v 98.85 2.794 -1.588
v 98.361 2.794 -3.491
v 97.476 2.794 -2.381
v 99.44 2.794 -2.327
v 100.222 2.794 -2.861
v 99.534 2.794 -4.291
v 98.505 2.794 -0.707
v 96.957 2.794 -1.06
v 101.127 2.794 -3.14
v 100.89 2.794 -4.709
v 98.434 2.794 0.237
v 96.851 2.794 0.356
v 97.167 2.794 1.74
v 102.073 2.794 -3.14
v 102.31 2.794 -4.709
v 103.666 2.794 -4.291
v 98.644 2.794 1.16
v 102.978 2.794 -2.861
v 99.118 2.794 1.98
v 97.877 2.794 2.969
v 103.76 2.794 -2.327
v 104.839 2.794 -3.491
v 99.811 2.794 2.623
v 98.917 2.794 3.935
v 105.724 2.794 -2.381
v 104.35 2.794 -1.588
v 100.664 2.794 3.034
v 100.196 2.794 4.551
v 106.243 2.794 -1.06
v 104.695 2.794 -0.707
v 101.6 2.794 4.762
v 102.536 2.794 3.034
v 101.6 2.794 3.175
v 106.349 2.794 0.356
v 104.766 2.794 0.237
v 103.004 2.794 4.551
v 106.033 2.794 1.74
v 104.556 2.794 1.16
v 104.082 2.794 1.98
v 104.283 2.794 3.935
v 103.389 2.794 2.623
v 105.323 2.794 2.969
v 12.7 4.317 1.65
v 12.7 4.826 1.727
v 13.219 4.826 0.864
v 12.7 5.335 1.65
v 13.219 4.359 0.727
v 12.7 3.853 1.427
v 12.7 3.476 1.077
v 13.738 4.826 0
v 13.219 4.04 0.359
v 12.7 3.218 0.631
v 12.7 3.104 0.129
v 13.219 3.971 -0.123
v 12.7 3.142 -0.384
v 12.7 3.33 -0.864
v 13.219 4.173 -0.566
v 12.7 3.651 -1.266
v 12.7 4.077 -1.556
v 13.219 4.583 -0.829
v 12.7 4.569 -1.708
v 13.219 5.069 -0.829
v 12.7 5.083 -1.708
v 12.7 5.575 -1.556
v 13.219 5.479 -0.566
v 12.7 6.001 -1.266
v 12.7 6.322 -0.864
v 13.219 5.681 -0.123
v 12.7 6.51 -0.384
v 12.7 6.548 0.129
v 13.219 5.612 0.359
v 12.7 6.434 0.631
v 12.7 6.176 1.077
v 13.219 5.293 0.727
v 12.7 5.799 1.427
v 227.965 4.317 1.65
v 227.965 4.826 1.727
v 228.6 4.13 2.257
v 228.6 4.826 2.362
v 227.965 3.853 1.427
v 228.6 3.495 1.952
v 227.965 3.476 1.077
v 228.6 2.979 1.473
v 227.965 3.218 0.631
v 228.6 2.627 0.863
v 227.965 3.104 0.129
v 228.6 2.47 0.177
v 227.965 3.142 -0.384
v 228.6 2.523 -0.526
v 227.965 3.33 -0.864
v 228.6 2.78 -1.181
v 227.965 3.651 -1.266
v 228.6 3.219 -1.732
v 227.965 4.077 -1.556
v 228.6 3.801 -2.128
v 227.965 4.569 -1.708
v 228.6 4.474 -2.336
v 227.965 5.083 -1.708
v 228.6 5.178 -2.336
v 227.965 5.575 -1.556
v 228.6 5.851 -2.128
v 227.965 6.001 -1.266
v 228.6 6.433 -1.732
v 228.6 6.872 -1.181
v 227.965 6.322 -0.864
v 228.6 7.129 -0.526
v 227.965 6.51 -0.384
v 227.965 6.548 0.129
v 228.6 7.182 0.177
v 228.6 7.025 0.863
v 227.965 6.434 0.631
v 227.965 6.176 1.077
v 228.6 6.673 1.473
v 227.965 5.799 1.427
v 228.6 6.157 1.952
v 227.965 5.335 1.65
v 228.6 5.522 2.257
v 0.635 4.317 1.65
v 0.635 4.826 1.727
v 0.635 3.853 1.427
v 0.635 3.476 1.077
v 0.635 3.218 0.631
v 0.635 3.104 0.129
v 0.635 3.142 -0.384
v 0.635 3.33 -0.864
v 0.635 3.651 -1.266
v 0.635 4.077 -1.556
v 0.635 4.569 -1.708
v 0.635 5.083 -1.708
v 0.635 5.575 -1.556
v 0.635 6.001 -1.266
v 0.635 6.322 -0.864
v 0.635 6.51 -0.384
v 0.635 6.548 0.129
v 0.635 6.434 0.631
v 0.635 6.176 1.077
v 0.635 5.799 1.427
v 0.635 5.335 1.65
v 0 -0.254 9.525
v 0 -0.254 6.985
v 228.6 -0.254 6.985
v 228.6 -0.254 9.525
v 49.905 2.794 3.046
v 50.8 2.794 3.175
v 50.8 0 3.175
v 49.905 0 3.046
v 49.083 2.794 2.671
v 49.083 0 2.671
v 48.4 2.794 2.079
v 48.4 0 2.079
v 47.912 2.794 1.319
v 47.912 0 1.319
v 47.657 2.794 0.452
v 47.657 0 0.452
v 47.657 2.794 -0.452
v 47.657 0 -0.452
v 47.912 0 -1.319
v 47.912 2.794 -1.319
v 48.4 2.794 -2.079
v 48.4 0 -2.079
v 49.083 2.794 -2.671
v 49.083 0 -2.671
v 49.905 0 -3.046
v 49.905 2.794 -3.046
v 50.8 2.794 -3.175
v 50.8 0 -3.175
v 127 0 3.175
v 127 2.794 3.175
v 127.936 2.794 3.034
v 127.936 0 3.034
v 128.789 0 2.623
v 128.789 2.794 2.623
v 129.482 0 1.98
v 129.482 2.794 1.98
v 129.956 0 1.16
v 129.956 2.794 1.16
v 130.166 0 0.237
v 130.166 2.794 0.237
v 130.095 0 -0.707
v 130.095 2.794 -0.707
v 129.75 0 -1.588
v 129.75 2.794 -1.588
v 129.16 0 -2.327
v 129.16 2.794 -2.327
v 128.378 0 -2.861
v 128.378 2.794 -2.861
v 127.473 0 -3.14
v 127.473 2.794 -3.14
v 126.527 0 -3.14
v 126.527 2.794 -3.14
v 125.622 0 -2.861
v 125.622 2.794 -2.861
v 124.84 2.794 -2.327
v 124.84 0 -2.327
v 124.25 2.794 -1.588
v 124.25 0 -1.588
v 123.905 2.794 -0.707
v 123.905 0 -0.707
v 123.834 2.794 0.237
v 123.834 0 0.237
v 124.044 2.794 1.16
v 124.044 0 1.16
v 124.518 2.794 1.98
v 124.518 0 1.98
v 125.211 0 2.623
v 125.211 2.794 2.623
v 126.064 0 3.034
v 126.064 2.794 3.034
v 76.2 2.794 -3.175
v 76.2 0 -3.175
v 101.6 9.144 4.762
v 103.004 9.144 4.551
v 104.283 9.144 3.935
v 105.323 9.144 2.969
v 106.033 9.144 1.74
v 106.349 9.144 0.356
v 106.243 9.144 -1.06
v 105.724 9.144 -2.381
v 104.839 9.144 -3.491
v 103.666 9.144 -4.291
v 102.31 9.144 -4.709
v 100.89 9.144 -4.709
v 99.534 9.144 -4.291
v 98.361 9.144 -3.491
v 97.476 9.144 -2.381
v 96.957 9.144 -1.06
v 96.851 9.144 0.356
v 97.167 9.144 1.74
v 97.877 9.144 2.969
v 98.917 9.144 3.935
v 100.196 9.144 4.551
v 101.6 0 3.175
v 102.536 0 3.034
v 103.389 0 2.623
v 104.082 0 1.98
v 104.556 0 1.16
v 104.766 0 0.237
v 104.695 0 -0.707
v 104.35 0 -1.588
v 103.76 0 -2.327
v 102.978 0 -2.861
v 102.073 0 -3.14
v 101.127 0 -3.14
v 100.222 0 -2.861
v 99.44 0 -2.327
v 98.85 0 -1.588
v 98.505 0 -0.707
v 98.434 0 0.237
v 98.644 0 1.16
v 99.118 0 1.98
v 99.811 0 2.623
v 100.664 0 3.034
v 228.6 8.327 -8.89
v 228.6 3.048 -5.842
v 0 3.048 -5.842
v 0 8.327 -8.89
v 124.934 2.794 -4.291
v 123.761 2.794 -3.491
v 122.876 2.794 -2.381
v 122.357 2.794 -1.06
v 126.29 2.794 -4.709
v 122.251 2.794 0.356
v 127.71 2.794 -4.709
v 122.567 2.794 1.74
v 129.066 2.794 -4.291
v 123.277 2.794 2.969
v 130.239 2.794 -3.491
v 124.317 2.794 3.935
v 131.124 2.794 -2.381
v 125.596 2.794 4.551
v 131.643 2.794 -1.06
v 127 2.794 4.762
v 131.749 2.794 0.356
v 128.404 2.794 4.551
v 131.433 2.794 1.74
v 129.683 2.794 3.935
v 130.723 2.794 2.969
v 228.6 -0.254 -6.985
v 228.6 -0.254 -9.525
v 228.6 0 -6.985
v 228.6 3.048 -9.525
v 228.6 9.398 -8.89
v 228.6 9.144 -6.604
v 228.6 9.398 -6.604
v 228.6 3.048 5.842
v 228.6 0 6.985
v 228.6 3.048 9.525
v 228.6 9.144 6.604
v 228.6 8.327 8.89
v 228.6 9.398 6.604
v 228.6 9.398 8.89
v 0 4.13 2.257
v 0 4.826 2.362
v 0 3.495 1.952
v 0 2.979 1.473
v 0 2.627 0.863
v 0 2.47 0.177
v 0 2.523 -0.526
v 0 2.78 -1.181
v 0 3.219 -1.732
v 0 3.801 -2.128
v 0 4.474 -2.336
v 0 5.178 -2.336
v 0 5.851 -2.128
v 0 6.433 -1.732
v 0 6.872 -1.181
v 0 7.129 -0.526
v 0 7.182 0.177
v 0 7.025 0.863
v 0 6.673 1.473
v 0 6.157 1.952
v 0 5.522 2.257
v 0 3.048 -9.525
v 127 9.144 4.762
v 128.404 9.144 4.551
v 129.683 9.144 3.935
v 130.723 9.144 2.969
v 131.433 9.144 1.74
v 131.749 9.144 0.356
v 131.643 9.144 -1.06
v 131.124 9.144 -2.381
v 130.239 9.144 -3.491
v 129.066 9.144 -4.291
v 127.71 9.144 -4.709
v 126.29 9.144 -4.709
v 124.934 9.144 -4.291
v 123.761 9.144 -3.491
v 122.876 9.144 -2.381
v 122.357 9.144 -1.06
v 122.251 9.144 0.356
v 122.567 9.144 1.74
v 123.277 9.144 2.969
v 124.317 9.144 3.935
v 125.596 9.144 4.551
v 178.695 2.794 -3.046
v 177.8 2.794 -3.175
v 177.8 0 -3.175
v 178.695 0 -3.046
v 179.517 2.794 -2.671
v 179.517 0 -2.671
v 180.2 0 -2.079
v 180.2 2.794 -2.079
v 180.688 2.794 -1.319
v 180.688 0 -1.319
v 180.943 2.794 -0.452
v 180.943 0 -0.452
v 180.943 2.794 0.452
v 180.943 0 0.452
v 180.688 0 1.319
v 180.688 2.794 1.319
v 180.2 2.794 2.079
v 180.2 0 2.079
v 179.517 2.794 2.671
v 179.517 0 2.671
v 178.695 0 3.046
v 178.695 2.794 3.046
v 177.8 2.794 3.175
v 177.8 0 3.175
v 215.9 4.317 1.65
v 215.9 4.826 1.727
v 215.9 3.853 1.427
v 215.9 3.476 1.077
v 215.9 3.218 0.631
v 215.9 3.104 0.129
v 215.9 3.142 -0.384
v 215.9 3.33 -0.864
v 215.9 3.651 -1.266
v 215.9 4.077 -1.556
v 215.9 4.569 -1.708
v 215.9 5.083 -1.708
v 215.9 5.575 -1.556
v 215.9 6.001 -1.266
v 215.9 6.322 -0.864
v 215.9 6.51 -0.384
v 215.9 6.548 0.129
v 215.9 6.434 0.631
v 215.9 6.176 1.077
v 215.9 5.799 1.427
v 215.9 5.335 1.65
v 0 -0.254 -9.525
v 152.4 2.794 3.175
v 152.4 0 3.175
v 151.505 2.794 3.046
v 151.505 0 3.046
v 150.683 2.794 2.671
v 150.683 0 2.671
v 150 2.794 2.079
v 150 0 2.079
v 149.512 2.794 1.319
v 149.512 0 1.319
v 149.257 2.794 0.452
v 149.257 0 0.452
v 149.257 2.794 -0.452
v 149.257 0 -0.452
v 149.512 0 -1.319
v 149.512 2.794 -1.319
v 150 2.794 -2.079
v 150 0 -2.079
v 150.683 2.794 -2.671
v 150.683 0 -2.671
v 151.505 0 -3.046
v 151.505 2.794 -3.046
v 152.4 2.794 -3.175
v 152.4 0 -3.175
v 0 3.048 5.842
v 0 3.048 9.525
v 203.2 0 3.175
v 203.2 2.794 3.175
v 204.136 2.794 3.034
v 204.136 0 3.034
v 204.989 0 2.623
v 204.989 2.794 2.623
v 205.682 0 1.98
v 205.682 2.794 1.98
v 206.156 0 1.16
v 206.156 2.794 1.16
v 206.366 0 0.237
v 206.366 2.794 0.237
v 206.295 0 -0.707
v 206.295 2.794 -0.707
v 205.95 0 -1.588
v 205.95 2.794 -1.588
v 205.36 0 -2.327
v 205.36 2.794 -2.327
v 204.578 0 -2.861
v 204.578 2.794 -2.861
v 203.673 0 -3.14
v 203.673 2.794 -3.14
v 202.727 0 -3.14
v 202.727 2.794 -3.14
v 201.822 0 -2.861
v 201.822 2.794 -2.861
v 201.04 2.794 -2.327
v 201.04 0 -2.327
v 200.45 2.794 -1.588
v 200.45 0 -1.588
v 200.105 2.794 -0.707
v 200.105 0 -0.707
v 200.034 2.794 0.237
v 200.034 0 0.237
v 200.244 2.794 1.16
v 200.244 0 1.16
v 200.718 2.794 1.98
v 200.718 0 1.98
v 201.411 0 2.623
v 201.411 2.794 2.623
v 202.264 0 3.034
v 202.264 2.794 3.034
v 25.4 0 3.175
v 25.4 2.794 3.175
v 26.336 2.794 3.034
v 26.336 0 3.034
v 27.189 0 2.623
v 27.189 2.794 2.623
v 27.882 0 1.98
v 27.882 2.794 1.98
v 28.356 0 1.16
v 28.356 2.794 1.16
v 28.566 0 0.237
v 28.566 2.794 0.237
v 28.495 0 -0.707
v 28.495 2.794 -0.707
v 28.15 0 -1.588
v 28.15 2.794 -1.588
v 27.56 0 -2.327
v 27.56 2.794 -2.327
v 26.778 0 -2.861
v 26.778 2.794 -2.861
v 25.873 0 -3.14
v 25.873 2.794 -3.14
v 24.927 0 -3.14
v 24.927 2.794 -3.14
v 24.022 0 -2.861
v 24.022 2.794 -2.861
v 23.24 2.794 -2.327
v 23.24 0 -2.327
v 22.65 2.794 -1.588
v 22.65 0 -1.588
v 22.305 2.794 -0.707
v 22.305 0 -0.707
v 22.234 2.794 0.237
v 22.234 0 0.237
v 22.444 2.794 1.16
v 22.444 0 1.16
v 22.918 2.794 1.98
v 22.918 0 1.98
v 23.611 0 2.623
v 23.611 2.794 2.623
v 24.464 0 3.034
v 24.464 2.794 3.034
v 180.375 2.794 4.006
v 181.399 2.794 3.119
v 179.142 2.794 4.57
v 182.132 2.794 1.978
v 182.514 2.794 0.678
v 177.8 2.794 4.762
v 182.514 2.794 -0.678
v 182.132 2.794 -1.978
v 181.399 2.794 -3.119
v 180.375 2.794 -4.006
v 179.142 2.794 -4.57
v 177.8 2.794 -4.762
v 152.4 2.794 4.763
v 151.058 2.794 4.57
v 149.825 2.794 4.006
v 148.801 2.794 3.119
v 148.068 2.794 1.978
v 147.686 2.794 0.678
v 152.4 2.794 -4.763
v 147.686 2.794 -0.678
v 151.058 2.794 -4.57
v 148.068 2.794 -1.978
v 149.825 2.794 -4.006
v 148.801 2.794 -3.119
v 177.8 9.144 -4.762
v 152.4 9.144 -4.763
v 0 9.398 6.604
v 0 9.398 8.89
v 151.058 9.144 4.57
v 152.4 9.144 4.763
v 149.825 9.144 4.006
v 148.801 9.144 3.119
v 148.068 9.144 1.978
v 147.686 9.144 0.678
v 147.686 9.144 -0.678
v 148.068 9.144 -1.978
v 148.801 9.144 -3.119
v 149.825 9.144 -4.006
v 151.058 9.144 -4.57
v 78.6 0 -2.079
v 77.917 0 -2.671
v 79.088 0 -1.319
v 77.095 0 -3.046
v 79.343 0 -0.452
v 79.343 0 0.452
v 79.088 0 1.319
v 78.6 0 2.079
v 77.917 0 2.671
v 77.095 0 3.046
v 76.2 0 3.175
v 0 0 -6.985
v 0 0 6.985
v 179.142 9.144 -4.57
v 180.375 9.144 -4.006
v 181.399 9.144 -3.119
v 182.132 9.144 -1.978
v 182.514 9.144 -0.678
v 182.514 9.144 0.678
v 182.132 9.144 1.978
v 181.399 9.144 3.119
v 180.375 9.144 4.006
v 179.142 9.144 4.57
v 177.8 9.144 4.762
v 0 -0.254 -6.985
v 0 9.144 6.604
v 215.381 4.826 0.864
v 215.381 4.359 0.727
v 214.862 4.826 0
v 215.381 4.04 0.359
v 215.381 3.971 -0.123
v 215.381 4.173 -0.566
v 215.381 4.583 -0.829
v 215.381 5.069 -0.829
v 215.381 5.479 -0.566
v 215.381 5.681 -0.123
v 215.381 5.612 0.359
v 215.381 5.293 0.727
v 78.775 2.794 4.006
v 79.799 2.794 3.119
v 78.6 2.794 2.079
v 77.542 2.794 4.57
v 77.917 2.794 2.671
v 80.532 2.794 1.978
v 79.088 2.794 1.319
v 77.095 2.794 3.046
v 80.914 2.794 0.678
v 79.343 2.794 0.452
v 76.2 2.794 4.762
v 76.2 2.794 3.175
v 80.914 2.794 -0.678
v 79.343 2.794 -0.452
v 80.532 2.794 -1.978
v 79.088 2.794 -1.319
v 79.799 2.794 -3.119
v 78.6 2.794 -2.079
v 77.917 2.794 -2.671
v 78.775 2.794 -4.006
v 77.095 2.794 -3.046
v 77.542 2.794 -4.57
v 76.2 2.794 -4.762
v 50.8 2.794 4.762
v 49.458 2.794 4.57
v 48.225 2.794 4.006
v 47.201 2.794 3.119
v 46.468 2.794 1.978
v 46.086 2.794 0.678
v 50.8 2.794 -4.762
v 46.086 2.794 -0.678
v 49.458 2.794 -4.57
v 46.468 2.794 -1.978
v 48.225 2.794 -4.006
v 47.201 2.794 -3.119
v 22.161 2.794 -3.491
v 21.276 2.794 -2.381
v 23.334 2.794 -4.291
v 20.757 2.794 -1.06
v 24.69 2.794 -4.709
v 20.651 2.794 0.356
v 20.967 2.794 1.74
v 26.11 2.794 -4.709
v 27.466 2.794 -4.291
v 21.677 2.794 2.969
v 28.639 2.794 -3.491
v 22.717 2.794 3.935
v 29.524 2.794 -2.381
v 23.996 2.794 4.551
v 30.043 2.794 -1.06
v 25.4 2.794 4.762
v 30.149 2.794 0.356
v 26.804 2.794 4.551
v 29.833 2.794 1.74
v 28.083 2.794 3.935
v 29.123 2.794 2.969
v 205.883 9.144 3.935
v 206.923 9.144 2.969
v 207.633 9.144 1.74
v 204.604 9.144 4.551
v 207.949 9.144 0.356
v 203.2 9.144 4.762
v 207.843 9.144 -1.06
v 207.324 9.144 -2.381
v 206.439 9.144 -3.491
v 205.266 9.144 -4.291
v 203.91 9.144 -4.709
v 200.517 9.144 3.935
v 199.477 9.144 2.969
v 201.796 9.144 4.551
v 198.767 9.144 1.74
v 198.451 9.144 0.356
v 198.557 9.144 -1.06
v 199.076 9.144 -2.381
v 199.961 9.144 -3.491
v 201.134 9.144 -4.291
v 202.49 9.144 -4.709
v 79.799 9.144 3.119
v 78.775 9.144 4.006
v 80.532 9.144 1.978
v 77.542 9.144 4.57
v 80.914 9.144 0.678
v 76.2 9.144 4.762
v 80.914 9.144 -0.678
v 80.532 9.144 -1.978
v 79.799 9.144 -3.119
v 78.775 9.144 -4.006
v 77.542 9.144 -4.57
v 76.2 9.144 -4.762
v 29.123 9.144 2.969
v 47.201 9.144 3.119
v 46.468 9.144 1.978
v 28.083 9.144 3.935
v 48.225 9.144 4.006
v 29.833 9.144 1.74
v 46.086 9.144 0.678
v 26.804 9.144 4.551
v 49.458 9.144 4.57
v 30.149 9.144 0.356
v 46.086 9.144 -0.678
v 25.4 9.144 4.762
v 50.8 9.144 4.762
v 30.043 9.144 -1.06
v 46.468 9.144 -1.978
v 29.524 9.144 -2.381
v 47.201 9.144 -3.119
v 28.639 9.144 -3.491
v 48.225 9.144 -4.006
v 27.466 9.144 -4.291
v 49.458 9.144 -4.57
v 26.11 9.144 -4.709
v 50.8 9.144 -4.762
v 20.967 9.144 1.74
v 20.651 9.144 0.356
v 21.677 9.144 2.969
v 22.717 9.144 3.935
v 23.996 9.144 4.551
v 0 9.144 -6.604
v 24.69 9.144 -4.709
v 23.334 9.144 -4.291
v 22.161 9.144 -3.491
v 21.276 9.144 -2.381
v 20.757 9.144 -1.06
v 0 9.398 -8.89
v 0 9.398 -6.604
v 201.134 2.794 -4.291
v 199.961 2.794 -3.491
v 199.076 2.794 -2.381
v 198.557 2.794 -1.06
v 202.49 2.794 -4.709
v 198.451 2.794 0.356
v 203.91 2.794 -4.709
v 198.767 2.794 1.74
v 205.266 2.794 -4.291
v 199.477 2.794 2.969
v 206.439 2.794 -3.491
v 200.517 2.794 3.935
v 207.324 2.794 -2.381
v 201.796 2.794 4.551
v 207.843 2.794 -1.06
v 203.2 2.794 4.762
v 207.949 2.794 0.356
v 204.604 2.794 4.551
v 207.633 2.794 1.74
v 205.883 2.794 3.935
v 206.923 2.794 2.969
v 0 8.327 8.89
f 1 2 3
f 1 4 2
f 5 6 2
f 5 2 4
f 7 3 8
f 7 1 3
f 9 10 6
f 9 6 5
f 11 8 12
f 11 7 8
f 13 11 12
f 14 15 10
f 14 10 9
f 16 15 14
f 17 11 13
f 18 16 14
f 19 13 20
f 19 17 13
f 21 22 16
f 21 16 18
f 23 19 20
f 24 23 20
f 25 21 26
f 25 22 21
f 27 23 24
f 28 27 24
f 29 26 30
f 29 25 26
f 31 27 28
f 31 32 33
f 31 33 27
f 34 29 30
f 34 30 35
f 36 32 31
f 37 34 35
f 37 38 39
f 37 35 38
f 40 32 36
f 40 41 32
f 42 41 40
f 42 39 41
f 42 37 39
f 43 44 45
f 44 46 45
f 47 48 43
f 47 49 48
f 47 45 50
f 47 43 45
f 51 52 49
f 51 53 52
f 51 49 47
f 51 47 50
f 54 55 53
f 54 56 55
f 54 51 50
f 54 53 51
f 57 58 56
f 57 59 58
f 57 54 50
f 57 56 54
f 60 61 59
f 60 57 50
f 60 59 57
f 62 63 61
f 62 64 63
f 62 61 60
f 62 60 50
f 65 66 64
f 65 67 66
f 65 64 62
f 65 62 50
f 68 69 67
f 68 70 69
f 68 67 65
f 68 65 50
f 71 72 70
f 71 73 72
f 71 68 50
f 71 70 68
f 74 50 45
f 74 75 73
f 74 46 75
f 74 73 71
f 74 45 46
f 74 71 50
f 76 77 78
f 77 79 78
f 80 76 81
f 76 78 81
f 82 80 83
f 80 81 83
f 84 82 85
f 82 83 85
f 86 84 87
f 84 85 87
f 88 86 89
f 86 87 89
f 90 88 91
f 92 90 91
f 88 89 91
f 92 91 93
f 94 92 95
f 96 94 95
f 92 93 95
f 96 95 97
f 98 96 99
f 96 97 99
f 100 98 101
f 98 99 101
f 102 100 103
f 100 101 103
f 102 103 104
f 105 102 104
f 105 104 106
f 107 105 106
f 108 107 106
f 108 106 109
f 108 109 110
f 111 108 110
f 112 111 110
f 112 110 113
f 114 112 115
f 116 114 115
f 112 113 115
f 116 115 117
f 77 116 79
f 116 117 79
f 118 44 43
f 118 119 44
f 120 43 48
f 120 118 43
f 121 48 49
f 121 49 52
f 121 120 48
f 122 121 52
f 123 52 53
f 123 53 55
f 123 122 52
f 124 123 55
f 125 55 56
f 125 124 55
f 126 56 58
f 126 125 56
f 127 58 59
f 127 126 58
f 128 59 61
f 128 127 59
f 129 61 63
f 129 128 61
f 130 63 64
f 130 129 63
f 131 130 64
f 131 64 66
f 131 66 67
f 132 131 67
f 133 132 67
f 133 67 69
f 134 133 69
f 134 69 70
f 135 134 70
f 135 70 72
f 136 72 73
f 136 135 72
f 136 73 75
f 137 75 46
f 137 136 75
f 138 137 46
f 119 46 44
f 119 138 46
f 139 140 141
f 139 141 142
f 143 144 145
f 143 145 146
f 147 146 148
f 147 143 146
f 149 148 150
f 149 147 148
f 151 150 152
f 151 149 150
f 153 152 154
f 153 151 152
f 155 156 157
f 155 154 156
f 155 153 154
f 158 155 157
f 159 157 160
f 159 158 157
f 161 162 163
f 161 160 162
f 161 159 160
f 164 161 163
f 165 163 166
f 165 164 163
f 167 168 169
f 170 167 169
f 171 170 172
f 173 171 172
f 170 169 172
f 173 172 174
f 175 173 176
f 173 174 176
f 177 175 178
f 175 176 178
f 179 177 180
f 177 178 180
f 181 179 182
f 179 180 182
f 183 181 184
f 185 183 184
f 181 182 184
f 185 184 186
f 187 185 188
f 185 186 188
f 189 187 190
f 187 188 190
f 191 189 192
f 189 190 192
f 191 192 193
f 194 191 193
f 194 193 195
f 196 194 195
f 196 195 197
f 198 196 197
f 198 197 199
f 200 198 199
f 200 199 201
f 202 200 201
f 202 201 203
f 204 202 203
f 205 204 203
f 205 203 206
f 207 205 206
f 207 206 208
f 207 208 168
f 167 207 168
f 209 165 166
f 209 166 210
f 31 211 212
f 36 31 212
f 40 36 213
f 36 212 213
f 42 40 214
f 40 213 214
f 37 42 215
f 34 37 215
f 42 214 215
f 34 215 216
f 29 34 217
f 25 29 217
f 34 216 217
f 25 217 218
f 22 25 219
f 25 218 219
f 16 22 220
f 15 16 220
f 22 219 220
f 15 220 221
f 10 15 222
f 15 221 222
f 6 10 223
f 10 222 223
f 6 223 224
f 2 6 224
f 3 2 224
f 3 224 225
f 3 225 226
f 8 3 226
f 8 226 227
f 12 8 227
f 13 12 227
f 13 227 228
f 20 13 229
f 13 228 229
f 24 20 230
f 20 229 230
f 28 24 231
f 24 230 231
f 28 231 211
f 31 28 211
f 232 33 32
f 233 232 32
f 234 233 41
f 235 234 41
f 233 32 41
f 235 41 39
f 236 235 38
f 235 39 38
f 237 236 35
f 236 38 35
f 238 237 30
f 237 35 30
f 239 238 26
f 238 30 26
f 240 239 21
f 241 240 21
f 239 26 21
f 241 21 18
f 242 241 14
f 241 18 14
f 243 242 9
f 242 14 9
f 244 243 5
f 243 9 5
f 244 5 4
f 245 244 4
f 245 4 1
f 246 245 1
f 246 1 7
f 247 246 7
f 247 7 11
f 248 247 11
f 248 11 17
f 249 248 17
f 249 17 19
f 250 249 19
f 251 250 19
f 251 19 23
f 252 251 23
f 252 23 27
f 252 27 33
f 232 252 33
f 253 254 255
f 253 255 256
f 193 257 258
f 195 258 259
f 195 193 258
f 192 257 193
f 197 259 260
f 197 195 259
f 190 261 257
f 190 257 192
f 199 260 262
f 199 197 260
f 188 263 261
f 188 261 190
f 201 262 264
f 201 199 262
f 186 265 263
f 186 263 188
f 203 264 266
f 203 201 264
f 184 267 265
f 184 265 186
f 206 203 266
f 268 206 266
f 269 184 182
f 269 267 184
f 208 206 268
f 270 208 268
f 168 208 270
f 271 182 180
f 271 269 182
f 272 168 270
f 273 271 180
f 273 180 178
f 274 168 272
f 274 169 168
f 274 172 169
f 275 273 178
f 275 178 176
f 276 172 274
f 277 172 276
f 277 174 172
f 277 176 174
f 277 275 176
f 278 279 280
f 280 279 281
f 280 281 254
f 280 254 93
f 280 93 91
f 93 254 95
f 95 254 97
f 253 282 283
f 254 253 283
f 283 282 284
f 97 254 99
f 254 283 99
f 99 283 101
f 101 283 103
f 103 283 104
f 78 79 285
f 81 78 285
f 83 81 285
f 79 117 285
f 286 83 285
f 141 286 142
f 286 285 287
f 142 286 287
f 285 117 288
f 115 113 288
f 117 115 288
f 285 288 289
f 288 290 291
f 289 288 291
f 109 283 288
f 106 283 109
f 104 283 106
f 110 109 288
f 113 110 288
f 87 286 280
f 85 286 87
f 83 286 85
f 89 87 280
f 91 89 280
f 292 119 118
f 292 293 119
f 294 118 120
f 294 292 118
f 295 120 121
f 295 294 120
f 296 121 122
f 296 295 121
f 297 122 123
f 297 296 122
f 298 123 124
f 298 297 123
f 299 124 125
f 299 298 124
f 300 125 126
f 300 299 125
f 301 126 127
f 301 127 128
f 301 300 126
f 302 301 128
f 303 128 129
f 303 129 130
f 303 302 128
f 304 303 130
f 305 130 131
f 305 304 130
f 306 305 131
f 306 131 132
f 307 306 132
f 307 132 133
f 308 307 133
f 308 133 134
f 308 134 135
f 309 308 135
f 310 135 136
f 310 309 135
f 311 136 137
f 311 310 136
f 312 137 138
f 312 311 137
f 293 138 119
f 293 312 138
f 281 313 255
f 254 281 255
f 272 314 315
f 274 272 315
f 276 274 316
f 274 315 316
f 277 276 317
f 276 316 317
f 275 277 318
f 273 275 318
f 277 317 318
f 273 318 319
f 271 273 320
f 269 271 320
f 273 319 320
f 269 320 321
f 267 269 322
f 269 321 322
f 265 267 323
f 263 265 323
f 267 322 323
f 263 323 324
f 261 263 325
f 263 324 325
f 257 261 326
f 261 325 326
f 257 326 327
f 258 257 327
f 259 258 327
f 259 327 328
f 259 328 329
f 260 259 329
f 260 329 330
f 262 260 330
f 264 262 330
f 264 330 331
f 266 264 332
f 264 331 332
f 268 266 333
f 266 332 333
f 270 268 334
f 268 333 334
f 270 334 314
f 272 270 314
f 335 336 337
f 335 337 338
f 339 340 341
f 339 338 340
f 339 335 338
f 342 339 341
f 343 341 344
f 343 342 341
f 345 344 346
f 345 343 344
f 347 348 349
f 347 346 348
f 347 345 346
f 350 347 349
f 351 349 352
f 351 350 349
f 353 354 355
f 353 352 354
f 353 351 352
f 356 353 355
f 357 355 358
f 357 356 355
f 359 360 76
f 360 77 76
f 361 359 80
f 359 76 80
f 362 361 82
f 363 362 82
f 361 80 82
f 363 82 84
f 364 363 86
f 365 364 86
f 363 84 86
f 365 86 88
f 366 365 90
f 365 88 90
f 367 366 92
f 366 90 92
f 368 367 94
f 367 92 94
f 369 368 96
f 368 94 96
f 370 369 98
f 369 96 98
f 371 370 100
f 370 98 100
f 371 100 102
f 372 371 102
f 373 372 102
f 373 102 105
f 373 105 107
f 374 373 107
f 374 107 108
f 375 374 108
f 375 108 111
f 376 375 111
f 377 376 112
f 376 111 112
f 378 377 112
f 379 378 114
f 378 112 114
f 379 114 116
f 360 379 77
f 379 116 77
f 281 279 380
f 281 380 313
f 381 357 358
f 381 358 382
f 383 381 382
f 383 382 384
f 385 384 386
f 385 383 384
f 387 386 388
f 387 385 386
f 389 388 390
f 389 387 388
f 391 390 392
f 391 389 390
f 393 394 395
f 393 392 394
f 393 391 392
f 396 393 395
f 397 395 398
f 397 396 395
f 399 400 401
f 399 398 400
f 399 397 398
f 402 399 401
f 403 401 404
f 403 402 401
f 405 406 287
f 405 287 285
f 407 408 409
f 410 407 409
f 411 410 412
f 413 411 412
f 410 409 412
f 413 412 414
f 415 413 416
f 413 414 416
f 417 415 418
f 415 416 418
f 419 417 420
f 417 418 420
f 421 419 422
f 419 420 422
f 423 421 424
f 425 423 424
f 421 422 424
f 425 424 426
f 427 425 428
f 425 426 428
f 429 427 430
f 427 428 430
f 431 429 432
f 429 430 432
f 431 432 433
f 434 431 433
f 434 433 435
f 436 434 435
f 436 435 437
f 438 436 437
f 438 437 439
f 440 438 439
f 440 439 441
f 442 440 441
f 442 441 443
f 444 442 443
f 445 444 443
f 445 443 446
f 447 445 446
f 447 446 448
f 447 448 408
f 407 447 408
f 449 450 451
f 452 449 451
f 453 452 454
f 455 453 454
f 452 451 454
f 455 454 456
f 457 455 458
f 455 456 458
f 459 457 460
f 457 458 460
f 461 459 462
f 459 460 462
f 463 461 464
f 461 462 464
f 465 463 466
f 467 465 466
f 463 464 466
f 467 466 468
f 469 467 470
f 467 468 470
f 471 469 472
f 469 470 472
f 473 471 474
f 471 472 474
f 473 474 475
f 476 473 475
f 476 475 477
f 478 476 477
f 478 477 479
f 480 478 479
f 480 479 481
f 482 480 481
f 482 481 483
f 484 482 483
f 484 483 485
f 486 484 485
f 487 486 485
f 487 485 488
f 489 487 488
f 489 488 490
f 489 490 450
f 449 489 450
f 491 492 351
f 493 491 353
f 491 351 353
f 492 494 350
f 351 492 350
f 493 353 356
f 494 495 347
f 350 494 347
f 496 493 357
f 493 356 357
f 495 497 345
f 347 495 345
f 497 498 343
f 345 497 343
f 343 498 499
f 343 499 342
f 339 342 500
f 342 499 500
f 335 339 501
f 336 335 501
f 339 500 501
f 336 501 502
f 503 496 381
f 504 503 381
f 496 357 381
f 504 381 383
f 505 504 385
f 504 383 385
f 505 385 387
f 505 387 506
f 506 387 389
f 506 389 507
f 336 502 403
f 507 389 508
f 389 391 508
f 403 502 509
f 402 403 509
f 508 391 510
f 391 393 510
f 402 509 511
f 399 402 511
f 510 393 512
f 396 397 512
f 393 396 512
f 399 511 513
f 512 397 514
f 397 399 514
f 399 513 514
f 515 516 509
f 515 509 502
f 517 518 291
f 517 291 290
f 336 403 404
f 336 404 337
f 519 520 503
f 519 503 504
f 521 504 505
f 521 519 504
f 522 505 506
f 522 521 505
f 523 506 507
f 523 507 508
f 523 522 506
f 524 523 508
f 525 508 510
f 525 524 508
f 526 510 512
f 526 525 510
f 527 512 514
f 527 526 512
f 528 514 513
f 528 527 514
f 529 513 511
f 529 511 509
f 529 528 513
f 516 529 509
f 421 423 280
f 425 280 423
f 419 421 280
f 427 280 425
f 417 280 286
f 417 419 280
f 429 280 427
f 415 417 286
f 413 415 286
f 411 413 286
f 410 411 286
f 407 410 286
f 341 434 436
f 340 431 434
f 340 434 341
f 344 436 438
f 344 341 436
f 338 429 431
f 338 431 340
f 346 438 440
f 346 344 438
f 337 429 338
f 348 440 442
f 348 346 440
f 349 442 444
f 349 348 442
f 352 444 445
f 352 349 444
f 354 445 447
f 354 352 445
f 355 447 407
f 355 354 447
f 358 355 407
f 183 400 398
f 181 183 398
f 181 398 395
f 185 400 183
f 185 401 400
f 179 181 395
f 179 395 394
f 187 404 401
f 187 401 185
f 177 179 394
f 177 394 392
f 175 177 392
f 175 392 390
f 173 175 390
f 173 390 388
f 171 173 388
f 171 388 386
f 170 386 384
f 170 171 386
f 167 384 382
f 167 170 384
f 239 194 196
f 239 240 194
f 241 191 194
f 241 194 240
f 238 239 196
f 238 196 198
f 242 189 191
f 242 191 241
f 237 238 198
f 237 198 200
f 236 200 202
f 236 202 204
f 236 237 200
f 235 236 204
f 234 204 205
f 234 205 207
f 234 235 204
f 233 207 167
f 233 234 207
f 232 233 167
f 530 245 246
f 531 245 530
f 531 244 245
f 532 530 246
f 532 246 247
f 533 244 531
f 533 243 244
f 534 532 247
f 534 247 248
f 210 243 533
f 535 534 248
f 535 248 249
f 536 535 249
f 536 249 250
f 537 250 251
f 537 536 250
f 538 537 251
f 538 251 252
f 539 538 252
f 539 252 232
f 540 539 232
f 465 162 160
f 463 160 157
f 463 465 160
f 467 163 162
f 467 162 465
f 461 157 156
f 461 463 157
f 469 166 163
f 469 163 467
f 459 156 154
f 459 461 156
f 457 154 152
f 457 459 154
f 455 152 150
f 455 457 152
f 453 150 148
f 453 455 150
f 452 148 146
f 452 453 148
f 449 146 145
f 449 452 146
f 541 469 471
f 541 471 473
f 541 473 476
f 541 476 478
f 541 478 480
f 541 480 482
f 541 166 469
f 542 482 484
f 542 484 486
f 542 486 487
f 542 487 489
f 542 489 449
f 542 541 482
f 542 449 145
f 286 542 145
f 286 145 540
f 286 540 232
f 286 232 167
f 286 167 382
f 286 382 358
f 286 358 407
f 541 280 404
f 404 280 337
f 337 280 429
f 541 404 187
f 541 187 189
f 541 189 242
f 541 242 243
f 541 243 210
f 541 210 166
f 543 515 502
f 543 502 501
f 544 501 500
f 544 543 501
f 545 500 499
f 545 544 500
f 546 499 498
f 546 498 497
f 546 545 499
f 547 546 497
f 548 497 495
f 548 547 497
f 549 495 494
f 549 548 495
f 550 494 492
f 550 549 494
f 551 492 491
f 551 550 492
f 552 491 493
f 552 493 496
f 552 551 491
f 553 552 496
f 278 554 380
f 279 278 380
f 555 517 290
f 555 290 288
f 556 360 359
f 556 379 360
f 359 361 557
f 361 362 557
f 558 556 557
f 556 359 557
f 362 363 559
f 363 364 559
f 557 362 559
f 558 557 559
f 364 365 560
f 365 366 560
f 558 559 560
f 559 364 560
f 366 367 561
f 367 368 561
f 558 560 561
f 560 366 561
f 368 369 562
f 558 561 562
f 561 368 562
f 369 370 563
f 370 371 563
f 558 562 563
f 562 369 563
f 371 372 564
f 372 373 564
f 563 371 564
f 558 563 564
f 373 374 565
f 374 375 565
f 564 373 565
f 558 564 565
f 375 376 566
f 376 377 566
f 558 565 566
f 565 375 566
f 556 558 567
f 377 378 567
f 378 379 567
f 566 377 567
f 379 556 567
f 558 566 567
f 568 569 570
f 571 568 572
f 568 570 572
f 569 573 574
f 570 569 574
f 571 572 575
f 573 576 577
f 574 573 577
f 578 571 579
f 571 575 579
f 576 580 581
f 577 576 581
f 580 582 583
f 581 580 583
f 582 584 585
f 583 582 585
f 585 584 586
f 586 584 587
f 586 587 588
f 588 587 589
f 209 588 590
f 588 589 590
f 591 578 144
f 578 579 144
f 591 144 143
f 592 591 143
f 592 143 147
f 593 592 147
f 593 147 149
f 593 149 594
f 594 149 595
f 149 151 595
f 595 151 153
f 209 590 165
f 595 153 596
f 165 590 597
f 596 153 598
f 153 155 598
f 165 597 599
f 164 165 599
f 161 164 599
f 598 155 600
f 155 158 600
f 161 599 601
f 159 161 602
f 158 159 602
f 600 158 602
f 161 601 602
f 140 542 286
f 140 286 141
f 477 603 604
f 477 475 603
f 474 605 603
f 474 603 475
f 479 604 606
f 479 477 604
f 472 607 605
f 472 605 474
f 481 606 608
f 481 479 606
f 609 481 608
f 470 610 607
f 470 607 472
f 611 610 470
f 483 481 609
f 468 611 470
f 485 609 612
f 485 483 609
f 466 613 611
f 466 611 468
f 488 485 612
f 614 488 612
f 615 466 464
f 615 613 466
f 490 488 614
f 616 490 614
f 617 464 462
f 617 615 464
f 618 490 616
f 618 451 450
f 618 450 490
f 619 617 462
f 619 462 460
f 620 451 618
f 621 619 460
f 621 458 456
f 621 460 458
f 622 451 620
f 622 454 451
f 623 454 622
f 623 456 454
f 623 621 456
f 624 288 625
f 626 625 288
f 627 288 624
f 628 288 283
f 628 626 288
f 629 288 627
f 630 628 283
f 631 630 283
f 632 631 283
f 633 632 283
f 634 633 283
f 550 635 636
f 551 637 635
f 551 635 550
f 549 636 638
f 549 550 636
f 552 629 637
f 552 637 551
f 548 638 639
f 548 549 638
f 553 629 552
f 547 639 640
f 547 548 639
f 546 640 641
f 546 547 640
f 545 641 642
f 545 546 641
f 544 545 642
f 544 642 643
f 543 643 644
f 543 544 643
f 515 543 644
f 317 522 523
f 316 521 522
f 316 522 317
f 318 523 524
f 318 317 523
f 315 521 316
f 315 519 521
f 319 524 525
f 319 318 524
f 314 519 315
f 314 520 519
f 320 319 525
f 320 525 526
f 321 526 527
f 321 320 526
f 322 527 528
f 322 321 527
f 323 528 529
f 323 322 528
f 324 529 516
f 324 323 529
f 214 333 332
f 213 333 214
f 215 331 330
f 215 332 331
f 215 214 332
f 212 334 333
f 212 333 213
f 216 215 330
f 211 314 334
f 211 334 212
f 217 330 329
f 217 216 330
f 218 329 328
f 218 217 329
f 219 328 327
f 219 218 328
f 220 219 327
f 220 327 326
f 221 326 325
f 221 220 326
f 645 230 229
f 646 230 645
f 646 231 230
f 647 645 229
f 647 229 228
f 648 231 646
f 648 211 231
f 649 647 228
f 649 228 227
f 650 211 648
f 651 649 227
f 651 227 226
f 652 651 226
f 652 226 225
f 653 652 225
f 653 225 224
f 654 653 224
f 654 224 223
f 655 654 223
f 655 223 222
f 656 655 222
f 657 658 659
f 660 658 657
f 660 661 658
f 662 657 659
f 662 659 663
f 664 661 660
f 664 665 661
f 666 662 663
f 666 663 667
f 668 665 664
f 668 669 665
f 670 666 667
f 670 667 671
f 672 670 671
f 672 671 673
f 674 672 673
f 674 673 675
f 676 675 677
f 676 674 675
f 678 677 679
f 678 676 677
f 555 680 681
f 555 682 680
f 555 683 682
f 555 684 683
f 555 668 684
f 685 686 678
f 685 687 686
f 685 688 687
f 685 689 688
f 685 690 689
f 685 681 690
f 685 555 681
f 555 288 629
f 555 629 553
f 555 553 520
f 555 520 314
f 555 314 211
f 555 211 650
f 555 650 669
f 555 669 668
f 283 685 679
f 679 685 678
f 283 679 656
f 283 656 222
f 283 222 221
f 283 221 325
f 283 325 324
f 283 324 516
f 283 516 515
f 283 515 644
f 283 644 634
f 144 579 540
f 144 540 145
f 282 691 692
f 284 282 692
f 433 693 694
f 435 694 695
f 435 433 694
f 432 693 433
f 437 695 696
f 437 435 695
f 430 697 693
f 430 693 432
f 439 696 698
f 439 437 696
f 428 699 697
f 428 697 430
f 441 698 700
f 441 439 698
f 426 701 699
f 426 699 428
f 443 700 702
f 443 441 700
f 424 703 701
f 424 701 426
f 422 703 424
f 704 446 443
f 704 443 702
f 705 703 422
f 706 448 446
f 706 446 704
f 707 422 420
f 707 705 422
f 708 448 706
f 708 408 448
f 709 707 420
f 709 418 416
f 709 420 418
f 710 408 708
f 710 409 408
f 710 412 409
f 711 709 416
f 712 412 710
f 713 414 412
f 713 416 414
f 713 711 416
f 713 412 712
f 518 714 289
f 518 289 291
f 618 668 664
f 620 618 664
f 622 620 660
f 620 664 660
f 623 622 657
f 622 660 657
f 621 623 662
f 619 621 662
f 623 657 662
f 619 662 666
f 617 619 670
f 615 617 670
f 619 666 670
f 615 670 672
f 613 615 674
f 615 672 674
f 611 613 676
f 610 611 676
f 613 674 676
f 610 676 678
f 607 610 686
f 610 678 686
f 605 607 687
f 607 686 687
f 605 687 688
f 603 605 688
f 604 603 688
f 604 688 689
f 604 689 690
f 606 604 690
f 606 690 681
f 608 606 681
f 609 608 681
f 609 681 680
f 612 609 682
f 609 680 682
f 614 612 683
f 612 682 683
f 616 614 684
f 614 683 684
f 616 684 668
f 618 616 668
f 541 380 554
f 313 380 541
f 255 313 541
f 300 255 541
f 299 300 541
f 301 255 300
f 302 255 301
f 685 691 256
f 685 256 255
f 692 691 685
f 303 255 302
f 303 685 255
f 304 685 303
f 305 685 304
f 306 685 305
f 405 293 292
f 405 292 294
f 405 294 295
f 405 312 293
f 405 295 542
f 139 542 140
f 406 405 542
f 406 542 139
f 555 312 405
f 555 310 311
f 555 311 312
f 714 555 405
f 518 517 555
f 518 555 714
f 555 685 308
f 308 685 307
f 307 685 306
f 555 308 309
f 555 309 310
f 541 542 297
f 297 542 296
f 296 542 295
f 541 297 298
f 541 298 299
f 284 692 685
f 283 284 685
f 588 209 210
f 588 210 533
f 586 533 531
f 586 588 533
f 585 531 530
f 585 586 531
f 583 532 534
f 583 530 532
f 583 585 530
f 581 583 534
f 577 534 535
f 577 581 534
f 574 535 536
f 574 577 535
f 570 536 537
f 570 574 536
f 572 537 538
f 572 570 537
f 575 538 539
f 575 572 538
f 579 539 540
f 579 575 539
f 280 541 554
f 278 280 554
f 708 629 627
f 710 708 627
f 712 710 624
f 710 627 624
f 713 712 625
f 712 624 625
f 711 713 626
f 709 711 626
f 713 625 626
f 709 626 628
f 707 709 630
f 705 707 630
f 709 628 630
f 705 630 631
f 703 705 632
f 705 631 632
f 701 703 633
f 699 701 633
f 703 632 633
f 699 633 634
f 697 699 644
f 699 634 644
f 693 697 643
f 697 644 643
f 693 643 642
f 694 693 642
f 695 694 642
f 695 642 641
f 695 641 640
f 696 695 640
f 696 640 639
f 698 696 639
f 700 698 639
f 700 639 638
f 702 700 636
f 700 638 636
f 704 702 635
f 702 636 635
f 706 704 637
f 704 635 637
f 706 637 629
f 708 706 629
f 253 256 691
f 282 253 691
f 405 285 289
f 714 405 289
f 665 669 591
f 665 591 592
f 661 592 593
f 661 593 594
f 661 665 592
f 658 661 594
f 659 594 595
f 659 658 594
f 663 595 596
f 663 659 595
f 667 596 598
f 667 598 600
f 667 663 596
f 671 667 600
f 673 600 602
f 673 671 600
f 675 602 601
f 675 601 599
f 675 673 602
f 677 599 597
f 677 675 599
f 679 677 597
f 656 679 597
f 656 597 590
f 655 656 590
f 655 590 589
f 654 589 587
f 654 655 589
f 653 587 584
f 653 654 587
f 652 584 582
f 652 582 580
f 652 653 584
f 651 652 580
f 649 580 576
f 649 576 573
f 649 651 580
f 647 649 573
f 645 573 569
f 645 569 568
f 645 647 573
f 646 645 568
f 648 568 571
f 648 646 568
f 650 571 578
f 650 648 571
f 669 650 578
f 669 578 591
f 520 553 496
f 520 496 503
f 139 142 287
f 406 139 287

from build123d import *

# Parameters (mm, degrees)
BOSS_EXTRUDE1_DEPTH = 228.6
SKETCH5_R           = 3.175
CUT_EXTRUDE1_DEPTH  = 229.99128374
SKETCH5_4_R         = 4.7625
CUT_EXTRUDE2_DEPTH  = 6.35


with BuildPart() as part:
    # Sketch1 → Boss-Extrude1 (new body)
    with BuildSketch(Plane(origin=(0, 0, 0), x_dir=(0, 0, -1), z_dir=(1, 0, 0))):
        Polygon((9.525, -0.254), (9.525, 3.048), (5.842, 3.048), (8.89, 8.327290861), (8.89, 9.398), (6.604, 9.398), (6.604, 9.144), (0, 9.144), (0, 0), (6.985, 0), (6.985, -0.254), align=None)
    boss_extrude1 = extrude(amount=BOSS_EXTRUDE1_DEPTH)

    # Mirror1: Boss-Extrude1 across plane
    add(boss_extrude1.mirror(Plane.XY))

    # Sketch4 → Tap Drill for #8-32 Tap2 (revolve, cut)
    with BuildSketch(Plane.ZX.offset(4.826)):
        Polygon((0, 0), (0, 13.737806461), (1.7272, 12.7), (1.7272, 0.635), (2.3622, 0), align=None)
    tap_drill_for_8_32_tap2 = revolve(axis=Axis((-6.35, 4.826, 0), (1, 0, 0)), mode=Mode.SUBTRACT)

    # Mirror2: Tap Drill for #8-32 Tap2 across plane
    add(tap_drill_for_8_32_tap2.mirror(Plane.ZY.offset(-114.3)), mode=Mode.SUBTRACT)

    # Sketch5 → Cut-Extrude1 (cut, through all)
    with BuildSketch(Plane(origin=(0, 9.144, 0), x_dir=(1, 0, 0), z_dir=(0, 1, 0))):
        with Locations((25.4, 0)):
            Circle(SKETCH5_R)
        with Locations((101.6, 0)):
            Circle(SKETCH5_R)
        with Locations((127, 0)):
            Circle(SKETCH5_R)
        with Locations((203.2, 0)):
            Circle(SKETCH5_R)
        with BuildLine():
            Line((50.8, 3.175), (76.2, 3.175))
            ThreePointArc((76.2, 3.175), (79.375, 0), (76.2, -3.175))
            Line((76.2, -3.175), (50.8, -3.175))
            ThreePointArc((50.8, -3.175), (47.625, 0), (50.8, 3.175))
        make_face()
        with BuildLine():
            Line((152.4, 3.175), (177.8, 3.175))
            ThreePointArc((177.8, 3.175), (180.975, 0), (177.8, -3.175))
            Line((177.8, -3.175), (152.4, -3.175))
            ThreePointArc((152.4, -3.175), (149.225, 0), (152.4, 3.175))
        make_face()
    extrude(amount=-CUT_EXTRUDE1_DEPTH, mode=Mode.SUBTRACT)

    # Sketch5<4> → Cut-Extrude2 (cut)
    with BuildSketch(Plane(origin=(0, 9.144, 0), x_dir=(1, 0, 0), z_dir=(0, 1, 0))):
        with Locations((25.4, 0)):
            Circle(SKETCH5_4_R)
        with Locations((101.6, 0)):
            Circle(SKETCH5_4_R)
        with Locations((127, 0)):
            Circle(SKETCH5_4_R)
        with Locations((203.2, 0)):
            Circle(SKETCH5_4_R)
        with BuildLine():
            Line((50.8, 4.7625), (76.2, 4.7625))
            ThreePointArc((76.2, 4.7625), (80.9625, 0), (76.2, -4.7625))
            Line((76.2, -4.7625), (50.8, -4.7625))
            ThreePointArc((50.8, -4.7625), (46.0375, 0), (50.8, 4.7625))
        make_face()
        with BuildLine():
            Line((152.4, 4.7625), (177.8, 4.7625))
            ThreePointArc((177.8, 4.7625), (182.5625, 0), (177.8, -4.7625))
            Line((177.8, -4.7625), (152.4, -4.7625))
            ThreePointArc((152.4, -4.7625), (147.6375, 0), (152.4, 4.7625))
        make_face()
    extrude(amount=-CUT_EXTRUDE2_DEPTH, mode=Mode.SUBTRACT)


solid = part.part
